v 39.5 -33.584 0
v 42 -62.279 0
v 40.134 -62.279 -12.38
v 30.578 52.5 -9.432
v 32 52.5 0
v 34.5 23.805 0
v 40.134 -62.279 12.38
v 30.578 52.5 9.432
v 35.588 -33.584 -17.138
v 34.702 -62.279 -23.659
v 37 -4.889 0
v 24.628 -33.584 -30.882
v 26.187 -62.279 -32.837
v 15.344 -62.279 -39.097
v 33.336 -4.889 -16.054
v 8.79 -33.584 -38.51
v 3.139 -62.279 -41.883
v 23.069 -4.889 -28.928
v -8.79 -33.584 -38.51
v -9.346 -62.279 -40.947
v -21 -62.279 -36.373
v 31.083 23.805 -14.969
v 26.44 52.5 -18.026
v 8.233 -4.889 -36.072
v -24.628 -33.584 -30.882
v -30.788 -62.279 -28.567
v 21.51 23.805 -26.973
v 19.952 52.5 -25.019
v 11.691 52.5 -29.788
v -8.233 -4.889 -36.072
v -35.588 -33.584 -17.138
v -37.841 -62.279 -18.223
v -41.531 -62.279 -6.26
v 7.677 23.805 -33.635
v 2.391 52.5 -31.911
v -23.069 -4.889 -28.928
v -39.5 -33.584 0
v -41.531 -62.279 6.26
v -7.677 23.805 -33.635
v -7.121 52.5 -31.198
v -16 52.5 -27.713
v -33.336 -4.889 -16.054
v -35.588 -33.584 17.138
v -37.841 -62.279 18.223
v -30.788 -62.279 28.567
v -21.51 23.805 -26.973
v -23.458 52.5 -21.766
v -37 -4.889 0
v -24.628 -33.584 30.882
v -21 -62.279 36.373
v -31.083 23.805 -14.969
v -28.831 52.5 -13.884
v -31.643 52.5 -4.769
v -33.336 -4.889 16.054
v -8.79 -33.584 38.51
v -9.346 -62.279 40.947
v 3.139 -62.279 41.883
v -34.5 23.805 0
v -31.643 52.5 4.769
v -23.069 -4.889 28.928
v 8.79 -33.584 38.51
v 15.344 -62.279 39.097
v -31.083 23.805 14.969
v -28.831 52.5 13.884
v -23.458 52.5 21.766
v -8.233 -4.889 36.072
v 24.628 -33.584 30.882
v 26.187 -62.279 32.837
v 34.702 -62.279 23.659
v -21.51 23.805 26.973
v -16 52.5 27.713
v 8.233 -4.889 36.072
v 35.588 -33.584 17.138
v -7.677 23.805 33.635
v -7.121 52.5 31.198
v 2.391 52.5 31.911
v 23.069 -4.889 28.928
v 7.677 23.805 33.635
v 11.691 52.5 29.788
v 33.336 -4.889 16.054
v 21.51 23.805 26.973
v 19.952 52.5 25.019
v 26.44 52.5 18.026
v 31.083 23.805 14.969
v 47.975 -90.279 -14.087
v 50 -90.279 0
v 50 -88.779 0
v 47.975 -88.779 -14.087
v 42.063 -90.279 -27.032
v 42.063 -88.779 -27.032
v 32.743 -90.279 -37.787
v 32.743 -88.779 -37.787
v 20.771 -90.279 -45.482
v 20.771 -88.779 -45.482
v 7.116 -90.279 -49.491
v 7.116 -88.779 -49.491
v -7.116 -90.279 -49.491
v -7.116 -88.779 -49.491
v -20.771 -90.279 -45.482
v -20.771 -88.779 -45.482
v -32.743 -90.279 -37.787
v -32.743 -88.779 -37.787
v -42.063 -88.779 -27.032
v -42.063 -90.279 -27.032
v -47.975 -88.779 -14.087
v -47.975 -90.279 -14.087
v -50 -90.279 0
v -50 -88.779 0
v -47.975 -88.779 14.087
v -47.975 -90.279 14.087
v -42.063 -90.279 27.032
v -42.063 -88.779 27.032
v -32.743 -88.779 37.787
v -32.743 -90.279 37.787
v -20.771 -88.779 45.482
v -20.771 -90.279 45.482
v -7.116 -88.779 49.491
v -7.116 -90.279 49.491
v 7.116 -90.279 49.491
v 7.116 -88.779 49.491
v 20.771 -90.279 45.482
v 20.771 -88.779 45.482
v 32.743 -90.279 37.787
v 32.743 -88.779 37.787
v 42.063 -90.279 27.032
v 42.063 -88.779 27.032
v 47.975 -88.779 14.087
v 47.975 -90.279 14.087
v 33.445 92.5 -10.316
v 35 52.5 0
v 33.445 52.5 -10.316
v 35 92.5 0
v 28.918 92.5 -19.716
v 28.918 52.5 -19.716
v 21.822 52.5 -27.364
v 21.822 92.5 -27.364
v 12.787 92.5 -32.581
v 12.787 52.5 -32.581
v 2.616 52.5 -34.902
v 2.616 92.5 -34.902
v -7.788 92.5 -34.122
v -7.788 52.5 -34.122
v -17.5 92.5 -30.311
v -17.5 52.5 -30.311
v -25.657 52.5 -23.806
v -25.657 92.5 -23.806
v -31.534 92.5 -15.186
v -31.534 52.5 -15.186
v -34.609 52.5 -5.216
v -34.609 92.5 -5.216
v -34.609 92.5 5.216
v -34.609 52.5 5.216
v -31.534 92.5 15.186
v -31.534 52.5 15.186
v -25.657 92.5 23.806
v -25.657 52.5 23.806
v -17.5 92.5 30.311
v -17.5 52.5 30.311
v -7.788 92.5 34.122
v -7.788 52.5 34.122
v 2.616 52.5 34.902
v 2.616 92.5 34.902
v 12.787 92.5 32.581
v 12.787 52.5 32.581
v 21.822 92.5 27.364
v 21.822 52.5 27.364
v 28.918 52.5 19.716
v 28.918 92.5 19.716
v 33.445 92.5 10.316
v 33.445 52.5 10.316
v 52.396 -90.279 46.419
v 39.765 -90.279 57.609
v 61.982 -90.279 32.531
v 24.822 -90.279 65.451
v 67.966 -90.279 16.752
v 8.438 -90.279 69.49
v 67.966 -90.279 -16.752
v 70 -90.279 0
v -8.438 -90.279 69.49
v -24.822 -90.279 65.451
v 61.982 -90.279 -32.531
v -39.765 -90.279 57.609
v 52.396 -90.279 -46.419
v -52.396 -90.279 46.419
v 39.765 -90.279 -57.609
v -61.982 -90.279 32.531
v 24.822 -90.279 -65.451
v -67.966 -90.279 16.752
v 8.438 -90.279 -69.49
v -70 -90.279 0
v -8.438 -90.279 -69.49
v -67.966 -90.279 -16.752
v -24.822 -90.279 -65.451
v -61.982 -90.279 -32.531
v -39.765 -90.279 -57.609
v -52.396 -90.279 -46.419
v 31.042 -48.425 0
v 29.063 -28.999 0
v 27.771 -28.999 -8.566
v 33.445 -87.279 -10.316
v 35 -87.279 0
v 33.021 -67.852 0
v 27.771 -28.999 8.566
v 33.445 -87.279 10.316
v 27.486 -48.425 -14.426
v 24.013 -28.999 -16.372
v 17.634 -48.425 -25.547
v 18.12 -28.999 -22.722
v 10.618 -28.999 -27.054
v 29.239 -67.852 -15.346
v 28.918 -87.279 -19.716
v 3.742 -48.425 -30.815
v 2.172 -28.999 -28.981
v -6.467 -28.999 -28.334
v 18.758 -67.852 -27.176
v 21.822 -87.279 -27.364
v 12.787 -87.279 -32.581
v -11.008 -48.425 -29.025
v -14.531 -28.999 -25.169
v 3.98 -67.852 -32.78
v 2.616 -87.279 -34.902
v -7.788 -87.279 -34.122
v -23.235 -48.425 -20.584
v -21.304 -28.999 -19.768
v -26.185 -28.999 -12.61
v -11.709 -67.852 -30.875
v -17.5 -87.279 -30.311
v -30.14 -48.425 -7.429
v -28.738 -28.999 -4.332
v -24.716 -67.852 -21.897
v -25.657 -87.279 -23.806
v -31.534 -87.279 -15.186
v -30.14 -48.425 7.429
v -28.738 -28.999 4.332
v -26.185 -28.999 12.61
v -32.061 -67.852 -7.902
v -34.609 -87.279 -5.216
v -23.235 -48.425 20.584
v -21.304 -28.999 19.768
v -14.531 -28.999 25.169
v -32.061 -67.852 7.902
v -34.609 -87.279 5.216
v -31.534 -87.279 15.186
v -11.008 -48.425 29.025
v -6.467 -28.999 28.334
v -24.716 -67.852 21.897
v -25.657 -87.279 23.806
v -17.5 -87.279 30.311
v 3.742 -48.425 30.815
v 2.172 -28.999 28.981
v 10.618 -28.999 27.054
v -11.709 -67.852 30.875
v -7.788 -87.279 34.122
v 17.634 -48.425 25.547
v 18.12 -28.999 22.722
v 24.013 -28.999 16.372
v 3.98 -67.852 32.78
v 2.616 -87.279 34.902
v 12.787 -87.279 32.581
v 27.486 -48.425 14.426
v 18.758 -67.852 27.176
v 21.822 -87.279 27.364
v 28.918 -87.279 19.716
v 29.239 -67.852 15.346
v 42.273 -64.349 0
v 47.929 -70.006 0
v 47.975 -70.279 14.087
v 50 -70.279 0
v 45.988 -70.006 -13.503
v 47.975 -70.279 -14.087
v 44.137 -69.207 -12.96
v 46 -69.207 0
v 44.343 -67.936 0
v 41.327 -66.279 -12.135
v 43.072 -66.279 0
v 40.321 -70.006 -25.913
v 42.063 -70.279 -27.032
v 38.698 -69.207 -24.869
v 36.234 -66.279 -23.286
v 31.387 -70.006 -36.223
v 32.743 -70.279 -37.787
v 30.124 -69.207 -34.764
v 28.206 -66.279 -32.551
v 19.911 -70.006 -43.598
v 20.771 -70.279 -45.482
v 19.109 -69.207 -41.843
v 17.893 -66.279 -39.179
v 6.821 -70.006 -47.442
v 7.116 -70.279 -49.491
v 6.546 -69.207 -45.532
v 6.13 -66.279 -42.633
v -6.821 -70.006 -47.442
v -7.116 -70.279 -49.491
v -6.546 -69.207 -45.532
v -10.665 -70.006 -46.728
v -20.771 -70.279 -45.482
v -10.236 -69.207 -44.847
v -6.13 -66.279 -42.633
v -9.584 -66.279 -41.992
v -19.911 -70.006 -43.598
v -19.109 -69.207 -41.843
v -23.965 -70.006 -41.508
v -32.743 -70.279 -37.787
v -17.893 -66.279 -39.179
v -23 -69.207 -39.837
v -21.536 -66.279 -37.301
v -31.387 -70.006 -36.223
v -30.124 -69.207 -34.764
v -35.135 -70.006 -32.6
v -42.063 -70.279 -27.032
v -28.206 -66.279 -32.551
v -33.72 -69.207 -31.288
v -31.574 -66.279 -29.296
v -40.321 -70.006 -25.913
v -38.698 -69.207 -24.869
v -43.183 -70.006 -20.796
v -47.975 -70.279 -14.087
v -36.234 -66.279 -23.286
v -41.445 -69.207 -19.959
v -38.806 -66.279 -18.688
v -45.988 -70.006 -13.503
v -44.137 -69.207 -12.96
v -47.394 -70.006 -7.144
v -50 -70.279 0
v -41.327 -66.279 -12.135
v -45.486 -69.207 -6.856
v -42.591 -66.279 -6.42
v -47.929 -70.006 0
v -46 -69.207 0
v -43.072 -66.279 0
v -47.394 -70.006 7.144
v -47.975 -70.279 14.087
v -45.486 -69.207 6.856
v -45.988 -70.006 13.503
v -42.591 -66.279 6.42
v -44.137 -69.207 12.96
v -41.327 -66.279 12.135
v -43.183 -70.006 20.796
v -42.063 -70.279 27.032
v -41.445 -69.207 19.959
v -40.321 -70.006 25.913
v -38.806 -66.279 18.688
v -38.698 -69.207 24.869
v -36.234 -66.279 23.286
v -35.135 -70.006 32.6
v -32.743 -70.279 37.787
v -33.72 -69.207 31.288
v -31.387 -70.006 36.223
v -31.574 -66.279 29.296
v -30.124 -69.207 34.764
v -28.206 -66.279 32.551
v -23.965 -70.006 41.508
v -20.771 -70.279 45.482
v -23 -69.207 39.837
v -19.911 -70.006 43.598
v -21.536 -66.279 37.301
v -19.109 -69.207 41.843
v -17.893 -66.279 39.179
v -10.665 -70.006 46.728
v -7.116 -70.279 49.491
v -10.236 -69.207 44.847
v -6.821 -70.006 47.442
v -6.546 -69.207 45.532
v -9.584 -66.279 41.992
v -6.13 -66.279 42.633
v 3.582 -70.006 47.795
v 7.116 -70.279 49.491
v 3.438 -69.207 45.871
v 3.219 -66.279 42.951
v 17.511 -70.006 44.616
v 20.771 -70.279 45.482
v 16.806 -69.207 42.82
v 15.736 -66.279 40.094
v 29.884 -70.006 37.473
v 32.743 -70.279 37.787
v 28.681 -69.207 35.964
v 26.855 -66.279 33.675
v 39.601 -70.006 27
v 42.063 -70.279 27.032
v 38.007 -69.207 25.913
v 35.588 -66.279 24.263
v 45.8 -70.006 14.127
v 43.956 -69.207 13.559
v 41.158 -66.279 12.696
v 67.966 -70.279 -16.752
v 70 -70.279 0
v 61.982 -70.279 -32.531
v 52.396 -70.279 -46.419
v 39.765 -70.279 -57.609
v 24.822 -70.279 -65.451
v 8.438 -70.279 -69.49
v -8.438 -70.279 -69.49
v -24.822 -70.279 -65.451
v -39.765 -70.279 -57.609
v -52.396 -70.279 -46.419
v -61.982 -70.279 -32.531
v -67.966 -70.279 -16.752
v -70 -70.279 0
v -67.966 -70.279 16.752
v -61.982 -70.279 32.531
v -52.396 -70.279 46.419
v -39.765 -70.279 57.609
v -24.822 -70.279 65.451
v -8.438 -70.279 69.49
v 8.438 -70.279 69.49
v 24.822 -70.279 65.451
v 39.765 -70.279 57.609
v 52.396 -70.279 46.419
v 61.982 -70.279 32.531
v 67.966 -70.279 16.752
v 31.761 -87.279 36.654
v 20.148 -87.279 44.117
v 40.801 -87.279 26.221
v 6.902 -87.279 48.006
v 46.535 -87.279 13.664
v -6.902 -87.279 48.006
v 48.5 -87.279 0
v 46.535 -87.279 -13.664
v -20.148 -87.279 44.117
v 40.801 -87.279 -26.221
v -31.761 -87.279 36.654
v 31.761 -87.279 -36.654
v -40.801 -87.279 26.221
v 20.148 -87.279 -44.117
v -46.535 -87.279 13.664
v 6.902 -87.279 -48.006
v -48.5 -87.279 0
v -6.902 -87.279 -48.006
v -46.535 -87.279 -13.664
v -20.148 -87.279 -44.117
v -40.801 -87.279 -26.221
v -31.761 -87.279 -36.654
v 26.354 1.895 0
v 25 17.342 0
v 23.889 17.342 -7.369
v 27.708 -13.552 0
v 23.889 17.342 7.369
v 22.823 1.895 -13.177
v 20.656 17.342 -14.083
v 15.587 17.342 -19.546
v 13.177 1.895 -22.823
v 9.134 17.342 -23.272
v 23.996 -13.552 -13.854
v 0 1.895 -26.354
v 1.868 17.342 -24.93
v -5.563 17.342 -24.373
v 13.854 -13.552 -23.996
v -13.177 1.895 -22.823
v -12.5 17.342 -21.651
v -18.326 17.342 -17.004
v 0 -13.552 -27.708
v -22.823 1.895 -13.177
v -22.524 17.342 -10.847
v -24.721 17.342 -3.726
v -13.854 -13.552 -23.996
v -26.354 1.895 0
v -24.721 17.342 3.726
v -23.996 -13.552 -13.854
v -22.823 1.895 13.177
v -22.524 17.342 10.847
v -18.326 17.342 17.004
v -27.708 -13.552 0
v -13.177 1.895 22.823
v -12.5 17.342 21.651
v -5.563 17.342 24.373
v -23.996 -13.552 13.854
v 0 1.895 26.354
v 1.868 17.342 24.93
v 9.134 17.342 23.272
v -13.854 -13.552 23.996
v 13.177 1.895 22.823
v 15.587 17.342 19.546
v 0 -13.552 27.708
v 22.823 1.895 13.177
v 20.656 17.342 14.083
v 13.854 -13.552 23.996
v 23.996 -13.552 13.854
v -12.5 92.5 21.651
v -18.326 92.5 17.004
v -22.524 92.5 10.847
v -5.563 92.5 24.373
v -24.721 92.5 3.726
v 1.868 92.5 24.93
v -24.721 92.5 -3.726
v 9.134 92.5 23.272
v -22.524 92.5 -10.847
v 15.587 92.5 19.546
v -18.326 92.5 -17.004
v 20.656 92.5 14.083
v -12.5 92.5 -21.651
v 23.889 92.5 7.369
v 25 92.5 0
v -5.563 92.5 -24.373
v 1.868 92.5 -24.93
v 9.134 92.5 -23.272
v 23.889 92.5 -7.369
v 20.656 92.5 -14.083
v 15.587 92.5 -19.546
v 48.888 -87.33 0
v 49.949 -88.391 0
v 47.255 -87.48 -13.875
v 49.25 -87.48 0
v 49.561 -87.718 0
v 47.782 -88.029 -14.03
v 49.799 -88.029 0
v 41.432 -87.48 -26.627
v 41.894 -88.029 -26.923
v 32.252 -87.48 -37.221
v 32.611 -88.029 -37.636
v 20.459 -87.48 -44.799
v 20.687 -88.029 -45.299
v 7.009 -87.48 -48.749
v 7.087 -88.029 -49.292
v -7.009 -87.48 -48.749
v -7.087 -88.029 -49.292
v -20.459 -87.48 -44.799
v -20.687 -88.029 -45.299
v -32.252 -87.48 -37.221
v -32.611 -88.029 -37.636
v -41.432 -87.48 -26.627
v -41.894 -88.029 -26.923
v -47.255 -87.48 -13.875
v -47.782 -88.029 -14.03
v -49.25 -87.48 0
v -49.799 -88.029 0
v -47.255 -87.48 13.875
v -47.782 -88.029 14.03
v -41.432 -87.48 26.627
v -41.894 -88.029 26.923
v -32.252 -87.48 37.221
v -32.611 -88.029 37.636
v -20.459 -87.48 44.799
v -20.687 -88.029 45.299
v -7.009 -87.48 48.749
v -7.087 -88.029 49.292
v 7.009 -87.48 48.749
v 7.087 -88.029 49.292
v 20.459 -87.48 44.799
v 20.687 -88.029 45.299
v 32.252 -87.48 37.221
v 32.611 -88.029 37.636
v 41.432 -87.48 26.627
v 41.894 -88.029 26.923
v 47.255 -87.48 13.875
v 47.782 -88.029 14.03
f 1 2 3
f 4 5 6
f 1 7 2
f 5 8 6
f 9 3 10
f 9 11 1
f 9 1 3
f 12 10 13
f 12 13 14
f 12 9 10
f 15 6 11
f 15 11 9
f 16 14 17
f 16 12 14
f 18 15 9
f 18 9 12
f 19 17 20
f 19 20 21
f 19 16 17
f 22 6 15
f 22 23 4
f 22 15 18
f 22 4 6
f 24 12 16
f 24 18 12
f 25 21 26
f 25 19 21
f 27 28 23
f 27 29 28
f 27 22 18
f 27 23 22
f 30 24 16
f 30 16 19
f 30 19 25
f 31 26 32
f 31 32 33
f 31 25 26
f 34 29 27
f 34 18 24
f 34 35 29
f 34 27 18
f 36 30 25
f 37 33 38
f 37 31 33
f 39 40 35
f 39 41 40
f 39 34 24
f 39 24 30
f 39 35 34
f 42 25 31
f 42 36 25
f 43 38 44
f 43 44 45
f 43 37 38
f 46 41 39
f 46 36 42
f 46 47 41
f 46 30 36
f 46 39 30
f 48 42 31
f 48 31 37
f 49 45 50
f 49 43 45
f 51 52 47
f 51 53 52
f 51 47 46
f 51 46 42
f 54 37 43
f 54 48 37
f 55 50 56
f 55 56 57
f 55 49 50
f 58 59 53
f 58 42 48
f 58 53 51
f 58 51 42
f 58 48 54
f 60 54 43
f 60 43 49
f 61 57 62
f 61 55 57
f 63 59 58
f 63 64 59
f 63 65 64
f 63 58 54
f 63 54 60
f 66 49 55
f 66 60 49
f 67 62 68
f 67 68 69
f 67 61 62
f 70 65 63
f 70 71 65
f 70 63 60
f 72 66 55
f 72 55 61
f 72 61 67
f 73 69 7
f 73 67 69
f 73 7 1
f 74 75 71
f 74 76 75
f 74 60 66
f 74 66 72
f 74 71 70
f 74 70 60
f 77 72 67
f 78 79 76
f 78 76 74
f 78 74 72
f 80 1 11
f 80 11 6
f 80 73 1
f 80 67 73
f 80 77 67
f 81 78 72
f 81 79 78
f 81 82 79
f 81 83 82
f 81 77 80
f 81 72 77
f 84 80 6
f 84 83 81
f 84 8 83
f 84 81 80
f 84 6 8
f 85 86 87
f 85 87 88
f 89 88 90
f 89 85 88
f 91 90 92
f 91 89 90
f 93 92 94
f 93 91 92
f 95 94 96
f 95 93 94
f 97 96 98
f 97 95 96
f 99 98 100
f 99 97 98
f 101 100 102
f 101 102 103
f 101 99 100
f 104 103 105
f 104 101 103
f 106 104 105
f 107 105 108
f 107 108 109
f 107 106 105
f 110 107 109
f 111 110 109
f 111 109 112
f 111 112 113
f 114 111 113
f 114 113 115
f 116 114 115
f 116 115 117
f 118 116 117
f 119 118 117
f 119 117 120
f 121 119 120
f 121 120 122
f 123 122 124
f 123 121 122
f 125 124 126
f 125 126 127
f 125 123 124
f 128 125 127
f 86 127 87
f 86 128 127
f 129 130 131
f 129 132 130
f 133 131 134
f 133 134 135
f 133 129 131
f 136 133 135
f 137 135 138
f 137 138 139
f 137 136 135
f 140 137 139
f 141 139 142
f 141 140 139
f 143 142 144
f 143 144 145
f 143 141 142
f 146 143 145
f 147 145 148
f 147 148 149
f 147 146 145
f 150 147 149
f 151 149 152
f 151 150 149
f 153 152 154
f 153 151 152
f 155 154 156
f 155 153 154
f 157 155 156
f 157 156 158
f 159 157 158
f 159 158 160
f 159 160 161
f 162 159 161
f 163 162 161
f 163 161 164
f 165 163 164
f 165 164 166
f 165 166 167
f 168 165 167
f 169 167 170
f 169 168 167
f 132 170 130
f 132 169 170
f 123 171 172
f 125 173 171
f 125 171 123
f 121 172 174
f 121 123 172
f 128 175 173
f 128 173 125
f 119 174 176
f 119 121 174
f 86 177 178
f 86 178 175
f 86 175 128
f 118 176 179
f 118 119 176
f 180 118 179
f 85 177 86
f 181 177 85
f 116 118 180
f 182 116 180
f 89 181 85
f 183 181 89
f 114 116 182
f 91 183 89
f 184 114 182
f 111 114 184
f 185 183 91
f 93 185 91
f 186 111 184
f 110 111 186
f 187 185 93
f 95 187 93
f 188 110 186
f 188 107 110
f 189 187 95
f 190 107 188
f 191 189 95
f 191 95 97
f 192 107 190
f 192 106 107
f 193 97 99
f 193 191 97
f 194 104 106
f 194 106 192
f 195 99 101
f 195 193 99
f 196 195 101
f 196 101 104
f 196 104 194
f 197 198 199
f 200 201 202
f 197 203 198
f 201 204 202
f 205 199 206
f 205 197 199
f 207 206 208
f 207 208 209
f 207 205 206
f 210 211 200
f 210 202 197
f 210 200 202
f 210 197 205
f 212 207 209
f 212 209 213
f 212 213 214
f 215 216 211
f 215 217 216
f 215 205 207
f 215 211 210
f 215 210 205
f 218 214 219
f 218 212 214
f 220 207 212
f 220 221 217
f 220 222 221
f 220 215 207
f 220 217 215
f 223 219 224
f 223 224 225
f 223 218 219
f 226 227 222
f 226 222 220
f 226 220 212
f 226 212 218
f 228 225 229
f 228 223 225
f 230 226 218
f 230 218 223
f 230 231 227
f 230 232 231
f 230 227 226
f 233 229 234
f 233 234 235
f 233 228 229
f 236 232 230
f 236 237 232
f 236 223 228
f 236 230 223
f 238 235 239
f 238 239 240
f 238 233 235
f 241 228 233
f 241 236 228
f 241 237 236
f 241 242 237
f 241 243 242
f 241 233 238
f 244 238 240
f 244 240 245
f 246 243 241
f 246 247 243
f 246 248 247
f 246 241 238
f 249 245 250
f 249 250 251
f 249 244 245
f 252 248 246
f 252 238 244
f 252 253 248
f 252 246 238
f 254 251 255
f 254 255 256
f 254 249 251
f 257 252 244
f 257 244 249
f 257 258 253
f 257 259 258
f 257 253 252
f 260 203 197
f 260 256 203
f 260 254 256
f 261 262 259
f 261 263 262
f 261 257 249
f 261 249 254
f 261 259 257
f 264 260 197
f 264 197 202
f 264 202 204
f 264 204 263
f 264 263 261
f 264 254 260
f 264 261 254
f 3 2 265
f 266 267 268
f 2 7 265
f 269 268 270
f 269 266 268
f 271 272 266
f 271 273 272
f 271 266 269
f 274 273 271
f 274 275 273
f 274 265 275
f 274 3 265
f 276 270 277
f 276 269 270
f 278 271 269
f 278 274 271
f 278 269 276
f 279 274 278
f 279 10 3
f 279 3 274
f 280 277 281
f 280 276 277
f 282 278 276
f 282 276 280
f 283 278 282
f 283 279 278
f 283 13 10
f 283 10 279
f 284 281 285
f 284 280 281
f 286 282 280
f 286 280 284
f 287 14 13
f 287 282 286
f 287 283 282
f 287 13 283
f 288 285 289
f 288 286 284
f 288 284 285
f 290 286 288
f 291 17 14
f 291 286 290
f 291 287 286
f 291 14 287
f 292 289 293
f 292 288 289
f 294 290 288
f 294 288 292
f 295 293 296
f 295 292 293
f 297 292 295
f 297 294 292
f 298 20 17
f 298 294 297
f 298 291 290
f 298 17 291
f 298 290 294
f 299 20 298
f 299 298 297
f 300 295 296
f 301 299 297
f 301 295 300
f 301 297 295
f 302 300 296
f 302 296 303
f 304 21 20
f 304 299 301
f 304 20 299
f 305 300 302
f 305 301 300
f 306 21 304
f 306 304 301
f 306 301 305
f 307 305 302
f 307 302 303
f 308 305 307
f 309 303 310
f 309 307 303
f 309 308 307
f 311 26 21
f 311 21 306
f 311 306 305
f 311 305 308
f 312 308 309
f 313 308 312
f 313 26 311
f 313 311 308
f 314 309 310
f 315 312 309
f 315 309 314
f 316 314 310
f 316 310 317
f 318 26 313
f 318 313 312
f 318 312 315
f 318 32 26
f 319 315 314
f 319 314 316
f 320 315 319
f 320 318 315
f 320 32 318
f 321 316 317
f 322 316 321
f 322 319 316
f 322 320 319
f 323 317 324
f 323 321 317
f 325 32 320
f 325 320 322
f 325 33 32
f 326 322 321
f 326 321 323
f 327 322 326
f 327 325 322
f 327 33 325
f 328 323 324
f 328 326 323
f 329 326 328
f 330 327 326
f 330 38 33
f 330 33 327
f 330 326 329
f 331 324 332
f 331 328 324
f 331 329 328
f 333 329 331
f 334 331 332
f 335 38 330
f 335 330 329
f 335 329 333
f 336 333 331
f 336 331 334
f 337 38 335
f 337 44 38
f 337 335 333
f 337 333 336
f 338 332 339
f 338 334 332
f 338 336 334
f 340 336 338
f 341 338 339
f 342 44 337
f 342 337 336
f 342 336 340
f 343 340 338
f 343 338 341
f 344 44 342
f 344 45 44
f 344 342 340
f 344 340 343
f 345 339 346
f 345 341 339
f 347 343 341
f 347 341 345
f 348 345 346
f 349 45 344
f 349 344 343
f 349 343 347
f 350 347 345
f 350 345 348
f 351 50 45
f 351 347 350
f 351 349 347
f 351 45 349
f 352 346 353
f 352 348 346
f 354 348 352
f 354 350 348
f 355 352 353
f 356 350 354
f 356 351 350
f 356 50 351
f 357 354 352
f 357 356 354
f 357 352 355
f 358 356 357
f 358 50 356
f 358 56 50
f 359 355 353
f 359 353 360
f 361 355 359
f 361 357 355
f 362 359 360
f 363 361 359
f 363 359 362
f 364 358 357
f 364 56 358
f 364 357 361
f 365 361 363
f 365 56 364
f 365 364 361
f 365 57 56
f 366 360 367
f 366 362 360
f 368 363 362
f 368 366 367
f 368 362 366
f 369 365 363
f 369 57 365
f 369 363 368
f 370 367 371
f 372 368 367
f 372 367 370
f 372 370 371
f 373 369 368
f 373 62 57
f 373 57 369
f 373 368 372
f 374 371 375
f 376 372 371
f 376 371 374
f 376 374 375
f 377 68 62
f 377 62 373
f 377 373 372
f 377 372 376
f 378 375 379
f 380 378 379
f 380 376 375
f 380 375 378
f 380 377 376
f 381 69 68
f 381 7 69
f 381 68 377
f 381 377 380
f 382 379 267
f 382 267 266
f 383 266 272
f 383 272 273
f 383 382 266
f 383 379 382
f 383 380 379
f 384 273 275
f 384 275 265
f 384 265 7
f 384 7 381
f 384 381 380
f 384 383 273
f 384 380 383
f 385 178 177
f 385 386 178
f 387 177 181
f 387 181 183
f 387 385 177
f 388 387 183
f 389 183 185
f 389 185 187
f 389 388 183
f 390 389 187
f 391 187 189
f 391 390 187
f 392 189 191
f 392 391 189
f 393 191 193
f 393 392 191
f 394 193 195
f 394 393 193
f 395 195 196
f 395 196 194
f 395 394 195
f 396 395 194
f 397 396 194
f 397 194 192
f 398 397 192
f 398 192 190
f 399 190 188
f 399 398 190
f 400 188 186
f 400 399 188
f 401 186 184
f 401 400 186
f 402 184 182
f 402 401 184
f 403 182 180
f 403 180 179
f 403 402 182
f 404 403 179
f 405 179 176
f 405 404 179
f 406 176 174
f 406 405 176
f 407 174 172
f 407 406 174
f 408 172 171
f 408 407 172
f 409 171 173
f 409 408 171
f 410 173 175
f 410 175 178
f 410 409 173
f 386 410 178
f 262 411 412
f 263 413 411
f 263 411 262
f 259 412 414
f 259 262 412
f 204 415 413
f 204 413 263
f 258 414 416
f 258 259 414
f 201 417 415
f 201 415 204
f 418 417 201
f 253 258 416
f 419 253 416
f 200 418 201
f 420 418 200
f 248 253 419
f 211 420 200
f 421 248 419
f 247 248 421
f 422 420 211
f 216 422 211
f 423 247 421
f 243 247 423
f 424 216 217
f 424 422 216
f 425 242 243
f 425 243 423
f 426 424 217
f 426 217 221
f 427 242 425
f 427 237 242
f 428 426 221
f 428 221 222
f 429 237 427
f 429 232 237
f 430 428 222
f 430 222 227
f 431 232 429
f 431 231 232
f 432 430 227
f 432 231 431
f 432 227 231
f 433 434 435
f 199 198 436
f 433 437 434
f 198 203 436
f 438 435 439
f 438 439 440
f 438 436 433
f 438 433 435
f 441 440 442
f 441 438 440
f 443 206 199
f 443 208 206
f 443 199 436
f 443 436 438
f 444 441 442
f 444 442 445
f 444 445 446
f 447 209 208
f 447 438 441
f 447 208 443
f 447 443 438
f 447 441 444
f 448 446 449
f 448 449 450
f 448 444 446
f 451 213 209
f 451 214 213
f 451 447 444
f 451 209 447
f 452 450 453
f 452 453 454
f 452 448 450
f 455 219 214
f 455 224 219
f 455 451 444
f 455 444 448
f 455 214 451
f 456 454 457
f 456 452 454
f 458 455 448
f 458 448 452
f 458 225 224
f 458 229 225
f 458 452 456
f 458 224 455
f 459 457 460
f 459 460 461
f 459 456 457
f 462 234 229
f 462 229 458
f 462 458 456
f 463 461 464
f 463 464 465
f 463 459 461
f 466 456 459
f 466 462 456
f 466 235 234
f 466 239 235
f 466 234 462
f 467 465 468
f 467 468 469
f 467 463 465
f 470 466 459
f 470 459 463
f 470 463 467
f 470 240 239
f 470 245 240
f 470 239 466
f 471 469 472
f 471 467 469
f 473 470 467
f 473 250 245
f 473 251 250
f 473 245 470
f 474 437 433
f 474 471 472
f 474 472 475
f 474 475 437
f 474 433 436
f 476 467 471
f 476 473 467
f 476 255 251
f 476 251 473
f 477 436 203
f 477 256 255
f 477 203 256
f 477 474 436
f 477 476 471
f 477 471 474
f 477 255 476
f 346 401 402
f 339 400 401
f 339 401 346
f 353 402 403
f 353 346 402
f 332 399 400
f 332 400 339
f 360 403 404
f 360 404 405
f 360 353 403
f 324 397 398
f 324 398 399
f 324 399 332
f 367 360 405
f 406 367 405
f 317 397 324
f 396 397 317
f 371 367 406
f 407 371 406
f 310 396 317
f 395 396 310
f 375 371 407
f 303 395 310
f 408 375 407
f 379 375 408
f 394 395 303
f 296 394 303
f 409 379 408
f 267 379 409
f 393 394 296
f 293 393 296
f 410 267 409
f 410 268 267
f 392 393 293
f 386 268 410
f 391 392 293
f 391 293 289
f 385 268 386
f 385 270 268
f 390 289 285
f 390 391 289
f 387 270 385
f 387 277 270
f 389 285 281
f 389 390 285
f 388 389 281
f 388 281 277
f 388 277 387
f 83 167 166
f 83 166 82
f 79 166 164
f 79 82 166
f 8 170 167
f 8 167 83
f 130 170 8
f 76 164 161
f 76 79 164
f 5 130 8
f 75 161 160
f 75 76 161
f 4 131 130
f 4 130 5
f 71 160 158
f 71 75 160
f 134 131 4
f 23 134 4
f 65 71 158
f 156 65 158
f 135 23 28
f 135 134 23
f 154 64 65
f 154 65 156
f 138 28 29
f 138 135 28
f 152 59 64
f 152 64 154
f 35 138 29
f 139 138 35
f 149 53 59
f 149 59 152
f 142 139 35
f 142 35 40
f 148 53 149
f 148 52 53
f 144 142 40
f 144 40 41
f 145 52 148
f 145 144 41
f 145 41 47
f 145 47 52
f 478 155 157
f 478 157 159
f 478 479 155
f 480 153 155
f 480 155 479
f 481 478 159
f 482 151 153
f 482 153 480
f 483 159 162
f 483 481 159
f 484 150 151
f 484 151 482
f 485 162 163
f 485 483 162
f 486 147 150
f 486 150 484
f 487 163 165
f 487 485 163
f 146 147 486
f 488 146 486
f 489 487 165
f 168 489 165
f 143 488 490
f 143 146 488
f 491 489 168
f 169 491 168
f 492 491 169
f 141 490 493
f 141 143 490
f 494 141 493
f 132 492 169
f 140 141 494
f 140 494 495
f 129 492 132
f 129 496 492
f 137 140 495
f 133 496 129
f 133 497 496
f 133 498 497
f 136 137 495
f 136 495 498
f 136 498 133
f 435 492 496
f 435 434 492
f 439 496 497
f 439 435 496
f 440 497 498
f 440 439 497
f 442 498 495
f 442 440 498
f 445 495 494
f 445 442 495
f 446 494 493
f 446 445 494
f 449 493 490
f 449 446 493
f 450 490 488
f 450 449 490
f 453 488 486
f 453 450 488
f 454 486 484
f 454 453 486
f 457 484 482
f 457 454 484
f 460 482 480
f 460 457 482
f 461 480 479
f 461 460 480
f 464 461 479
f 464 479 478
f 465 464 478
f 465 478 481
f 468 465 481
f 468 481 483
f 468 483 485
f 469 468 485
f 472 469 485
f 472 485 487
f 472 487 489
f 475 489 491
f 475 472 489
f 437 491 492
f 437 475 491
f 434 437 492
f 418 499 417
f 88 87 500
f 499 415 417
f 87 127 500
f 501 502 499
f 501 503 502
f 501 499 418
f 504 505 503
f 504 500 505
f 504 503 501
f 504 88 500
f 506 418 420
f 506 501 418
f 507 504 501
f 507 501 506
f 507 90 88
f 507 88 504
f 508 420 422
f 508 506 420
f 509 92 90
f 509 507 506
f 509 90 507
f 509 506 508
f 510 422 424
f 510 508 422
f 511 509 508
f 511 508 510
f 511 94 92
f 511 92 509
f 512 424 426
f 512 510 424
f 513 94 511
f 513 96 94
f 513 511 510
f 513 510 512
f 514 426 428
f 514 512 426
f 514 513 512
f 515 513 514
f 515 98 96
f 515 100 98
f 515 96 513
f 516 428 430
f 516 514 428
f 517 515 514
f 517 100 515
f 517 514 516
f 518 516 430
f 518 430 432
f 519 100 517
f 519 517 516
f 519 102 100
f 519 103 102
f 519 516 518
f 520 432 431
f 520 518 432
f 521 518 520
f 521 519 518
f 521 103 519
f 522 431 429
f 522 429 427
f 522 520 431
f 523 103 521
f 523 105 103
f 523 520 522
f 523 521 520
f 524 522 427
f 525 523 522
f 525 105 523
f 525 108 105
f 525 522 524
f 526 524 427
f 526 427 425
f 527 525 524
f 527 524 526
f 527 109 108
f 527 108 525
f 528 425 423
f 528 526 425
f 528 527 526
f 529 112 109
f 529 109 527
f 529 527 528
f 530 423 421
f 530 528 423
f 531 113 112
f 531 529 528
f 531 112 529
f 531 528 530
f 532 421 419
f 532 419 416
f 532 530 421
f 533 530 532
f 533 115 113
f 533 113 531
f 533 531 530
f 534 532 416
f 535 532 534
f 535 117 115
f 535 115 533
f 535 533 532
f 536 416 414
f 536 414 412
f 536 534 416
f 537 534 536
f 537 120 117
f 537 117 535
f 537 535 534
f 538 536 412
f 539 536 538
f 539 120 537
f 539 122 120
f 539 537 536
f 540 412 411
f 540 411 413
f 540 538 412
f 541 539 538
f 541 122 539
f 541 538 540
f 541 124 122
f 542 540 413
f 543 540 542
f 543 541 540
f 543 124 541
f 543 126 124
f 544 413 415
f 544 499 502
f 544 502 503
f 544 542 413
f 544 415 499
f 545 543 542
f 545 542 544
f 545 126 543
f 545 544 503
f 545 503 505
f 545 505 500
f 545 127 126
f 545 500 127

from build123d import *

# Parameters (mm, degrees)
FILLET1_R = 1.5


with BuildPart() as part:
    # Sketch1 → Revolve1 (revolve)
    with BuildSketch(Plane.XY):
        with BuildLine():
            Line((29.062623268, -28.998781924), (35, -87.278860618))
            Line((35, -87.278860618), (50, -87.278860618))
            Line((50, -87.278860618), (50, -90.278860618))
            Line((50, -90.278860618), (70, -90.278860618))
            Line((70, -90.278860618), (70, -70.278860618))
            Line((70, -70.278860618), (50, -70.278860618))
            ThreePointArc((50, -70.278860618), (44.343145751, -67.935714867), (42, -62.278860618))
            Line((42, -62.278860618), (32, 52.5))
            Line((32, 52.5), (35, 52.5))
            Line((35, 52.5), (35, 92.5))
            Line((35, 92.5), (25, 92.5))
            Line((25, 92.5), (25, 17.342006044))
            Line((25, 17.342006044), (29.062623268, -28.998781924))
        make_face()
    revolve(axis=Axis((0, -90.278860618, 0), (0, 1, 0)))

    # Fillet1
    fillet1_edges = [part.edges().sort_by_distance(p)[0] for p in [
        (-50, -87.278860618, 0),
    ]]
    fillet(fillet1_edges, radius=FILLET1_R)


solid = part.part
